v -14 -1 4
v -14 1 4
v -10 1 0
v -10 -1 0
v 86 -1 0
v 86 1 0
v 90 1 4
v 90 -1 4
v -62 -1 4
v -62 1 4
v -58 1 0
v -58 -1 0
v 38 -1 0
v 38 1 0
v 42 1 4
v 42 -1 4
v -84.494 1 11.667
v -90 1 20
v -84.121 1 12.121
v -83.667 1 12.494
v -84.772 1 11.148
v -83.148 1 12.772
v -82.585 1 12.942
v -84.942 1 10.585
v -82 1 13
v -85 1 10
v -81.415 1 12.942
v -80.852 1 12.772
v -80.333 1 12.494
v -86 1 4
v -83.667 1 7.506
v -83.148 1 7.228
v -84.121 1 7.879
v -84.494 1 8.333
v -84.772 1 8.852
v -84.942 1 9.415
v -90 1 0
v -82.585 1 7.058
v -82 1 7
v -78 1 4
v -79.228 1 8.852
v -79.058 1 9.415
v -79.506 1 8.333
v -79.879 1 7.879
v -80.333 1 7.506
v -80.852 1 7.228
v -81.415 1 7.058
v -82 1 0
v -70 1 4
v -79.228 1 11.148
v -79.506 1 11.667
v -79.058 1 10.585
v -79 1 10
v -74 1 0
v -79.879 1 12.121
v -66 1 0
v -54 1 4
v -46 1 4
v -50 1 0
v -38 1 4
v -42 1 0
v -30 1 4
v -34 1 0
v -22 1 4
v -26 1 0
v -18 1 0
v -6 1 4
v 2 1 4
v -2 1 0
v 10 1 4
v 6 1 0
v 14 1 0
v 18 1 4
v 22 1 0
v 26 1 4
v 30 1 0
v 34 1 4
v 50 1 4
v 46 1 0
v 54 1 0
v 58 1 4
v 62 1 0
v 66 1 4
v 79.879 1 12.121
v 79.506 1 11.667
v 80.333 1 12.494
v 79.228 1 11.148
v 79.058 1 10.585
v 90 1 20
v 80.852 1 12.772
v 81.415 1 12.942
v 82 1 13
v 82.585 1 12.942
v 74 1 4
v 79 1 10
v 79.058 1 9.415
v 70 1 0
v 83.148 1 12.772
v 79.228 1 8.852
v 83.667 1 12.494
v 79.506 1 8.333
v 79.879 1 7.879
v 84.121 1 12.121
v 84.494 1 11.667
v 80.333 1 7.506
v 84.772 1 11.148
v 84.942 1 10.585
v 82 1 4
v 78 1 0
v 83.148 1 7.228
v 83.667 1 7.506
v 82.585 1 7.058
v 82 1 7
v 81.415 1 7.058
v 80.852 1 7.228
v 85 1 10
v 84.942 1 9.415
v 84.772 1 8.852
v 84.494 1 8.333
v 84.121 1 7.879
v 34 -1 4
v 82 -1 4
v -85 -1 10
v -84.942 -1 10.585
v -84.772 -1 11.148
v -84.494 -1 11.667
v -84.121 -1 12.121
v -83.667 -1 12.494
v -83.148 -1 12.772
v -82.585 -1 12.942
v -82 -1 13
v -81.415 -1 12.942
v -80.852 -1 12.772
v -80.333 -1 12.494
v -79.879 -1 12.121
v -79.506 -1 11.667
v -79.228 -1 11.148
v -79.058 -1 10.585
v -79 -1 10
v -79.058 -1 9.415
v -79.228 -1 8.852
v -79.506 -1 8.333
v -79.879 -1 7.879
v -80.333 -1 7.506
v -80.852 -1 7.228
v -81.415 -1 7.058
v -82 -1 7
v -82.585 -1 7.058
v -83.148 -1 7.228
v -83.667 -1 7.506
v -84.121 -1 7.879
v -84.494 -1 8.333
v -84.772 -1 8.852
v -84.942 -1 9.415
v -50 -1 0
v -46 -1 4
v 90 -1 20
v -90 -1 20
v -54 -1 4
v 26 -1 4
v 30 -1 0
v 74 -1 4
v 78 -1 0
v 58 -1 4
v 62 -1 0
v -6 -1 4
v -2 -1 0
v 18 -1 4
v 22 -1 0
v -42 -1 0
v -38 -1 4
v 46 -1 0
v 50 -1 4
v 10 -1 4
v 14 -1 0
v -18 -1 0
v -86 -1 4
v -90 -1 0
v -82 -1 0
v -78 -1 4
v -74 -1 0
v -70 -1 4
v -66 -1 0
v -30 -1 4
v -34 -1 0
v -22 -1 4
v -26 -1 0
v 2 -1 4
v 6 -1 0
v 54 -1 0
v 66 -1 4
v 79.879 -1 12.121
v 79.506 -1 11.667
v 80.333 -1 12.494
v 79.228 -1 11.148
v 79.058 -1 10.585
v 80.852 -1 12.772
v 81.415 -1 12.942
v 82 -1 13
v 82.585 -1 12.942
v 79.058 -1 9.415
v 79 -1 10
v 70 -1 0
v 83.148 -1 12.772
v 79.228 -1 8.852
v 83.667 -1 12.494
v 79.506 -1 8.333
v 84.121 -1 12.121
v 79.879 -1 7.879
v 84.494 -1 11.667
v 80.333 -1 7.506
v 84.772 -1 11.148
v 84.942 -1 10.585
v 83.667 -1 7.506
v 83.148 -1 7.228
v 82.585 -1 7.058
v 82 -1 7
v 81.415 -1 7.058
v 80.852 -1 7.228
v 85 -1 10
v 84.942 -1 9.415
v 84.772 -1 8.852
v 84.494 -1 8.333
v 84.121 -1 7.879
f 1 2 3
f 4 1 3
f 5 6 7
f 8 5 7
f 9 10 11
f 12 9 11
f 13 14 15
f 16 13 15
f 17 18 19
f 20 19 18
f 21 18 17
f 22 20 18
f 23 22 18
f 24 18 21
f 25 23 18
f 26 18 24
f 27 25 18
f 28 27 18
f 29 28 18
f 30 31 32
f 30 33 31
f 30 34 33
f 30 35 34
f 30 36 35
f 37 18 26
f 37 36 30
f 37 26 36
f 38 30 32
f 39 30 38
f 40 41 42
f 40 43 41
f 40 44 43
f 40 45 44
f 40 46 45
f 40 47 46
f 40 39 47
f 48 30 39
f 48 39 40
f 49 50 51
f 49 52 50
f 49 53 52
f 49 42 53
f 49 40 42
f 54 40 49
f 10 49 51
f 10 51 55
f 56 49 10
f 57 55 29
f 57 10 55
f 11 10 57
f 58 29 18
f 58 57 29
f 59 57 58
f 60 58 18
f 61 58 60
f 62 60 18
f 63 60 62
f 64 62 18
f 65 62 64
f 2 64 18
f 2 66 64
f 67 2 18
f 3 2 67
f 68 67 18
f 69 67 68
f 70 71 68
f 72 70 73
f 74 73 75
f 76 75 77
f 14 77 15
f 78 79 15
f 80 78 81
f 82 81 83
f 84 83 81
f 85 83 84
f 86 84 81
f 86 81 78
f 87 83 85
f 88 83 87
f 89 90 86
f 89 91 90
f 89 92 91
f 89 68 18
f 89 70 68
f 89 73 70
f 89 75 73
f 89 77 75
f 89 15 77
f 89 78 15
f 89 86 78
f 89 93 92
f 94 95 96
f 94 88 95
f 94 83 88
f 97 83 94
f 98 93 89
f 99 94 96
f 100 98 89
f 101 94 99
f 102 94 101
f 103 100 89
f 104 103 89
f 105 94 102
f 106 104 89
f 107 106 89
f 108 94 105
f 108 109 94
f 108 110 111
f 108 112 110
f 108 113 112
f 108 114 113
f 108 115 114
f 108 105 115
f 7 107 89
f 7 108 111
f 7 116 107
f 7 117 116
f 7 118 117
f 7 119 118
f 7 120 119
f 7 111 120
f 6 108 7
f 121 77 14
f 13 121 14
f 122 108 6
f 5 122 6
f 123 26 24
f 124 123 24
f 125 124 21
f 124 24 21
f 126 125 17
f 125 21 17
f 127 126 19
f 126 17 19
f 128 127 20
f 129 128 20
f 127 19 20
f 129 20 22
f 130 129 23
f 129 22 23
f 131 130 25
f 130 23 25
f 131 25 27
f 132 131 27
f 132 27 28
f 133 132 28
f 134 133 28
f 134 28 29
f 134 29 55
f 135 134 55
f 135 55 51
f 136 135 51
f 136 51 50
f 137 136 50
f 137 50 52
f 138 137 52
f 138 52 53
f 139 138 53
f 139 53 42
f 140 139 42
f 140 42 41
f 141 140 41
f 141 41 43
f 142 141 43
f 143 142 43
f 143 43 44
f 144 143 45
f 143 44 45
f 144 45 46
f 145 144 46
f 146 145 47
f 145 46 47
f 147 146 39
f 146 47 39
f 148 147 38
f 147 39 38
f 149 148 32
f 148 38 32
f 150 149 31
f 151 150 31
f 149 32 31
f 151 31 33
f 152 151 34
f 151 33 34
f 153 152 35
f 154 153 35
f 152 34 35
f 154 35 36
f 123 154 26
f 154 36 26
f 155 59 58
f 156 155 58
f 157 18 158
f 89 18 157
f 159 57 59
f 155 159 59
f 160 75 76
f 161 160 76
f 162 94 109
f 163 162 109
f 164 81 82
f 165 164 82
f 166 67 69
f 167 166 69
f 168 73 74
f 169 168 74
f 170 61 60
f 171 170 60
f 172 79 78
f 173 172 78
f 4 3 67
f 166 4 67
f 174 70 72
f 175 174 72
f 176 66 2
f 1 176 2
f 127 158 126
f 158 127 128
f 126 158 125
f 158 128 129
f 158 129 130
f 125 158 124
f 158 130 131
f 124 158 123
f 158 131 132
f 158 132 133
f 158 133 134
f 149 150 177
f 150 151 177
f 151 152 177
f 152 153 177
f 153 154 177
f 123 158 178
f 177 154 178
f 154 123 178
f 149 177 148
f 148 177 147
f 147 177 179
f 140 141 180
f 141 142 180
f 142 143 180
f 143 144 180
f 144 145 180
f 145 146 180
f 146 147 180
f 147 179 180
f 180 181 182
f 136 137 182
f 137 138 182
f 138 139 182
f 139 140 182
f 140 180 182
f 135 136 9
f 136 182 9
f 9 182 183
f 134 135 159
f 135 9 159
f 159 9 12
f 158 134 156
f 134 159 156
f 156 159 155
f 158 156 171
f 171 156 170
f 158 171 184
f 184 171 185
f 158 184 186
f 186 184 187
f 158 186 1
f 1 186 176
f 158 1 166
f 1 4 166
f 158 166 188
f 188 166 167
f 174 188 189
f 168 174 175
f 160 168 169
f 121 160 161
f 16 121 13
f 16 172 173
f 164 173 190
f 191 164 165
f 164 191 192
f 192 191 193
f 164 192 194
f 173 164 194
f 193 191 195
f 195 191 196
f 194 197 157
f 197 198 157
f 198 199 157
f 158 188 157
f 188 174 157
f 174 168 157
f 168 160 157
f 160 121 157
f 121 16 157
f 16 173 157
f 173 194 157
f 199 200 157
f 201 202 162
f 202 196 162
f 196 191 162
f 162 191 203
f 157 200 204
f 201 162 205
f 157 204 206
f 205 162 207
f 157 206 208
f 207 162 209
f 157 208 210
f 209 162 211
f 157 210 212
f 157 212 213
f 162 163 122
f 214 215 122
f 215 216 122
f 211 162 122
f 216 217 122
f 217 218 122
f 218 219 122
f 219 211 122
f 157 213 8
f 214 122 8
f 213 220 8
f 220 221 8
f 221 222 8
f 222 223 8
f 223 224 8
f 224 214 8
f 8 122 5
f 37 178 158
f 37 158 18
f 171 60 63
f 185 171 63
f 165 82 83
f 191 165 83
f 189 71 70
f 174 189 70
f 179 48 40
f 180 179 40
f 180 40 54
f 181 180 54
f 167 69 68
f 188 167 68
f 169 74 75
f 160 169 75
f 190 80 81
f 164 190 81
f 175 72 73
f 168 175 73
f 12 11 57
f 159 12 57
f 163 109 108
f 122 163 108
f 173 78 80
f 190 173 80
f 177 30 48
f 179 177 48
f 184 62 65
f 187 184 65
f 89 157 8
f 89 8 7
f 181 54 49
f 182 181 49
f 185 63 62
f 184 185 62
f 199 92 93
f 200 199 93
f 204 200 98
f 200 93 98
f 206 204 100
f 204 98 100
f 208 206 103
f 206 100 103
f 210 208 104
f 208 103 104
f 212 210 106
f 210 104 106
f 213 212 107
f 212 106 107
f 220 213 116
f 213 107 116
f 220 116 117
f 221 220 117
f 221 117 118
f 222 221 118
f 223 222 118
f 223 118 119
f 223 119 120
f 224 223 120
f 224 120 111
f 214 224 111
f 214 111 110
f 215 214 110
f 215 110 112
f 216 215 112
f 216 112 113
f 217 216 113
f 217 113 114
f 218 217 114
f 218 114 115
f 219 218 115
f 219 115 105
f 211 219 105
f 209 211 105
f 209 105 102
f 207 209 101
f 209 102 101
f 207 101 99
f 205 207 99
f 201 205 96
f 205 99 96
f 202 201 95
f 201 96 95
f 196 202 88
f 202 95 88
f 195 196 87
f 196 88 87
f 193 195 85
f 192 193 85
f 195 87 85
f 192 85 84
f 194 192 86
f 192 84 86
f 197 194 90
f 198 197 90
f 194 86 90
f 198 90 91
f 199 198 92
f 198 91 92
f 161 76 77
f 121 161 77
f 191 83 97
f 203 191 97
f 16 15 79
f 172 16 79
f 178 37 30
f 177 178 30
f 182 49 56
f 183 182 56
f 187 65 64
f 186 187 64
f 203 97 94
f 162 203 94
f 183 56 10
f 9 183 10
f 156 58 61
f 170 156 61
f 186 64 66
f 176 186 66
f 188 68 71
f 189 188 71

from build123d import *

# Parameters (mm, degrees)
SKETCH1_W           = 180
SKETCH1_H           = 2
BOSS_EXTRUDE1_DEPTH = 20
SKETCH2_R           = 3
CUT_EXTRUDE1_DEPTH  = 20
CUT_EXTRUDE2_DEPTH  = 20


with BuildPart() as part:
    # Sketch1 → Boss-Extrude1 (new body)
    with BuildSketch(Plane.XY):
        Rectangle(SKETCH1_W, SKETCH1_H)
    extrude(amount=BOSS_EXTRUDE1_DEPTH)

    # Sketch2 → Cut-Extrude1 (cut)
    with BuildSketch(Plane(origin=(0, 1, 0), x_dir=(1, 0, 0), z_dir=(0, 1, 0))):
        with Locations(Location((82, -10, 0), (0, 0, 270))):
            Circle(SKETCH2_R)
        with Locations(Location((-82, -10, 0), (0, 0, 180))):
            Circle(SKETCH2_R)
    extrude(amount=-CUT_EXTRUDE1_DEPTH, mode=Mode.SUBTRACT)

    # Sketch3 → Cut-Extrude2 (cut)
    with BuildSketch(Plane(origin=(0, 1, 0), x_dir=(1, 0, 0), z_dir=(0, 1, 0))):
        Polygon((-14, -4), (-10, 0), (-18, 0), align=None)
        Polygon((-22, -4), (-18, 0), (-26, 0), align=None)
        Polygon((82, -4), (86, 0), (78, 0), align=None)
        Polygon((86, 0), (90, -4), (90, 0), align=None)
        Polygon((74, -4), (78, 0), (70, 0), align=None)
        Polygon((66, -4), (70, 0), (62, 0), align=None)
        Polygon((58, -4), (62, 0), (54, 0), align=None)
        Polygon((50, -4), (54, 0), (46, 0), align=None)
        Polygon((42, -4), (46, 0), (38, 0), align=None)
        Polygon((34, -4), (38, 0), (30, 0), align=None)
        Polygon((26, -4), (30, 0), (22, 0), align=None)
        Polygon((18, -4), (22, 0), (14, 0), align=None)
        Polygon((10, -4), (14, 0), (6, 0), align=None)
        Polygon((2, -4), (6, 0), (-2, 0), align=None)
        Polygon((-30, -4), (-26, 0), (-34, 0), align=None)
        Polygon((-6, -4), (-2, 0), (-10, 0), align=None)
        Polygon((-38, -4), (-34, 0), (-42, 0), align=None)
        Polygon((-86, -4), (-82, 0), (-90, 0), align=None)
        Polygon((-78, -4), (-74, 0), (-82, 0), align=None)
        Polygon((-70, -4), (-66, 0), (-74, 0), align=None)
        Polygon((-62, -4), (-58, 0), (-66, 0), align=None)
        Polygon((-54, -4), (-50, 0), (-58, 0), align=None)
        Polygon((-46, -4), (-42, 0), (-50, 0), align=None)
    extrude(amount=-CUT_EXTRUDE2_DEPTH, mode=Mode.SUBTRACT)


solid = part.part
